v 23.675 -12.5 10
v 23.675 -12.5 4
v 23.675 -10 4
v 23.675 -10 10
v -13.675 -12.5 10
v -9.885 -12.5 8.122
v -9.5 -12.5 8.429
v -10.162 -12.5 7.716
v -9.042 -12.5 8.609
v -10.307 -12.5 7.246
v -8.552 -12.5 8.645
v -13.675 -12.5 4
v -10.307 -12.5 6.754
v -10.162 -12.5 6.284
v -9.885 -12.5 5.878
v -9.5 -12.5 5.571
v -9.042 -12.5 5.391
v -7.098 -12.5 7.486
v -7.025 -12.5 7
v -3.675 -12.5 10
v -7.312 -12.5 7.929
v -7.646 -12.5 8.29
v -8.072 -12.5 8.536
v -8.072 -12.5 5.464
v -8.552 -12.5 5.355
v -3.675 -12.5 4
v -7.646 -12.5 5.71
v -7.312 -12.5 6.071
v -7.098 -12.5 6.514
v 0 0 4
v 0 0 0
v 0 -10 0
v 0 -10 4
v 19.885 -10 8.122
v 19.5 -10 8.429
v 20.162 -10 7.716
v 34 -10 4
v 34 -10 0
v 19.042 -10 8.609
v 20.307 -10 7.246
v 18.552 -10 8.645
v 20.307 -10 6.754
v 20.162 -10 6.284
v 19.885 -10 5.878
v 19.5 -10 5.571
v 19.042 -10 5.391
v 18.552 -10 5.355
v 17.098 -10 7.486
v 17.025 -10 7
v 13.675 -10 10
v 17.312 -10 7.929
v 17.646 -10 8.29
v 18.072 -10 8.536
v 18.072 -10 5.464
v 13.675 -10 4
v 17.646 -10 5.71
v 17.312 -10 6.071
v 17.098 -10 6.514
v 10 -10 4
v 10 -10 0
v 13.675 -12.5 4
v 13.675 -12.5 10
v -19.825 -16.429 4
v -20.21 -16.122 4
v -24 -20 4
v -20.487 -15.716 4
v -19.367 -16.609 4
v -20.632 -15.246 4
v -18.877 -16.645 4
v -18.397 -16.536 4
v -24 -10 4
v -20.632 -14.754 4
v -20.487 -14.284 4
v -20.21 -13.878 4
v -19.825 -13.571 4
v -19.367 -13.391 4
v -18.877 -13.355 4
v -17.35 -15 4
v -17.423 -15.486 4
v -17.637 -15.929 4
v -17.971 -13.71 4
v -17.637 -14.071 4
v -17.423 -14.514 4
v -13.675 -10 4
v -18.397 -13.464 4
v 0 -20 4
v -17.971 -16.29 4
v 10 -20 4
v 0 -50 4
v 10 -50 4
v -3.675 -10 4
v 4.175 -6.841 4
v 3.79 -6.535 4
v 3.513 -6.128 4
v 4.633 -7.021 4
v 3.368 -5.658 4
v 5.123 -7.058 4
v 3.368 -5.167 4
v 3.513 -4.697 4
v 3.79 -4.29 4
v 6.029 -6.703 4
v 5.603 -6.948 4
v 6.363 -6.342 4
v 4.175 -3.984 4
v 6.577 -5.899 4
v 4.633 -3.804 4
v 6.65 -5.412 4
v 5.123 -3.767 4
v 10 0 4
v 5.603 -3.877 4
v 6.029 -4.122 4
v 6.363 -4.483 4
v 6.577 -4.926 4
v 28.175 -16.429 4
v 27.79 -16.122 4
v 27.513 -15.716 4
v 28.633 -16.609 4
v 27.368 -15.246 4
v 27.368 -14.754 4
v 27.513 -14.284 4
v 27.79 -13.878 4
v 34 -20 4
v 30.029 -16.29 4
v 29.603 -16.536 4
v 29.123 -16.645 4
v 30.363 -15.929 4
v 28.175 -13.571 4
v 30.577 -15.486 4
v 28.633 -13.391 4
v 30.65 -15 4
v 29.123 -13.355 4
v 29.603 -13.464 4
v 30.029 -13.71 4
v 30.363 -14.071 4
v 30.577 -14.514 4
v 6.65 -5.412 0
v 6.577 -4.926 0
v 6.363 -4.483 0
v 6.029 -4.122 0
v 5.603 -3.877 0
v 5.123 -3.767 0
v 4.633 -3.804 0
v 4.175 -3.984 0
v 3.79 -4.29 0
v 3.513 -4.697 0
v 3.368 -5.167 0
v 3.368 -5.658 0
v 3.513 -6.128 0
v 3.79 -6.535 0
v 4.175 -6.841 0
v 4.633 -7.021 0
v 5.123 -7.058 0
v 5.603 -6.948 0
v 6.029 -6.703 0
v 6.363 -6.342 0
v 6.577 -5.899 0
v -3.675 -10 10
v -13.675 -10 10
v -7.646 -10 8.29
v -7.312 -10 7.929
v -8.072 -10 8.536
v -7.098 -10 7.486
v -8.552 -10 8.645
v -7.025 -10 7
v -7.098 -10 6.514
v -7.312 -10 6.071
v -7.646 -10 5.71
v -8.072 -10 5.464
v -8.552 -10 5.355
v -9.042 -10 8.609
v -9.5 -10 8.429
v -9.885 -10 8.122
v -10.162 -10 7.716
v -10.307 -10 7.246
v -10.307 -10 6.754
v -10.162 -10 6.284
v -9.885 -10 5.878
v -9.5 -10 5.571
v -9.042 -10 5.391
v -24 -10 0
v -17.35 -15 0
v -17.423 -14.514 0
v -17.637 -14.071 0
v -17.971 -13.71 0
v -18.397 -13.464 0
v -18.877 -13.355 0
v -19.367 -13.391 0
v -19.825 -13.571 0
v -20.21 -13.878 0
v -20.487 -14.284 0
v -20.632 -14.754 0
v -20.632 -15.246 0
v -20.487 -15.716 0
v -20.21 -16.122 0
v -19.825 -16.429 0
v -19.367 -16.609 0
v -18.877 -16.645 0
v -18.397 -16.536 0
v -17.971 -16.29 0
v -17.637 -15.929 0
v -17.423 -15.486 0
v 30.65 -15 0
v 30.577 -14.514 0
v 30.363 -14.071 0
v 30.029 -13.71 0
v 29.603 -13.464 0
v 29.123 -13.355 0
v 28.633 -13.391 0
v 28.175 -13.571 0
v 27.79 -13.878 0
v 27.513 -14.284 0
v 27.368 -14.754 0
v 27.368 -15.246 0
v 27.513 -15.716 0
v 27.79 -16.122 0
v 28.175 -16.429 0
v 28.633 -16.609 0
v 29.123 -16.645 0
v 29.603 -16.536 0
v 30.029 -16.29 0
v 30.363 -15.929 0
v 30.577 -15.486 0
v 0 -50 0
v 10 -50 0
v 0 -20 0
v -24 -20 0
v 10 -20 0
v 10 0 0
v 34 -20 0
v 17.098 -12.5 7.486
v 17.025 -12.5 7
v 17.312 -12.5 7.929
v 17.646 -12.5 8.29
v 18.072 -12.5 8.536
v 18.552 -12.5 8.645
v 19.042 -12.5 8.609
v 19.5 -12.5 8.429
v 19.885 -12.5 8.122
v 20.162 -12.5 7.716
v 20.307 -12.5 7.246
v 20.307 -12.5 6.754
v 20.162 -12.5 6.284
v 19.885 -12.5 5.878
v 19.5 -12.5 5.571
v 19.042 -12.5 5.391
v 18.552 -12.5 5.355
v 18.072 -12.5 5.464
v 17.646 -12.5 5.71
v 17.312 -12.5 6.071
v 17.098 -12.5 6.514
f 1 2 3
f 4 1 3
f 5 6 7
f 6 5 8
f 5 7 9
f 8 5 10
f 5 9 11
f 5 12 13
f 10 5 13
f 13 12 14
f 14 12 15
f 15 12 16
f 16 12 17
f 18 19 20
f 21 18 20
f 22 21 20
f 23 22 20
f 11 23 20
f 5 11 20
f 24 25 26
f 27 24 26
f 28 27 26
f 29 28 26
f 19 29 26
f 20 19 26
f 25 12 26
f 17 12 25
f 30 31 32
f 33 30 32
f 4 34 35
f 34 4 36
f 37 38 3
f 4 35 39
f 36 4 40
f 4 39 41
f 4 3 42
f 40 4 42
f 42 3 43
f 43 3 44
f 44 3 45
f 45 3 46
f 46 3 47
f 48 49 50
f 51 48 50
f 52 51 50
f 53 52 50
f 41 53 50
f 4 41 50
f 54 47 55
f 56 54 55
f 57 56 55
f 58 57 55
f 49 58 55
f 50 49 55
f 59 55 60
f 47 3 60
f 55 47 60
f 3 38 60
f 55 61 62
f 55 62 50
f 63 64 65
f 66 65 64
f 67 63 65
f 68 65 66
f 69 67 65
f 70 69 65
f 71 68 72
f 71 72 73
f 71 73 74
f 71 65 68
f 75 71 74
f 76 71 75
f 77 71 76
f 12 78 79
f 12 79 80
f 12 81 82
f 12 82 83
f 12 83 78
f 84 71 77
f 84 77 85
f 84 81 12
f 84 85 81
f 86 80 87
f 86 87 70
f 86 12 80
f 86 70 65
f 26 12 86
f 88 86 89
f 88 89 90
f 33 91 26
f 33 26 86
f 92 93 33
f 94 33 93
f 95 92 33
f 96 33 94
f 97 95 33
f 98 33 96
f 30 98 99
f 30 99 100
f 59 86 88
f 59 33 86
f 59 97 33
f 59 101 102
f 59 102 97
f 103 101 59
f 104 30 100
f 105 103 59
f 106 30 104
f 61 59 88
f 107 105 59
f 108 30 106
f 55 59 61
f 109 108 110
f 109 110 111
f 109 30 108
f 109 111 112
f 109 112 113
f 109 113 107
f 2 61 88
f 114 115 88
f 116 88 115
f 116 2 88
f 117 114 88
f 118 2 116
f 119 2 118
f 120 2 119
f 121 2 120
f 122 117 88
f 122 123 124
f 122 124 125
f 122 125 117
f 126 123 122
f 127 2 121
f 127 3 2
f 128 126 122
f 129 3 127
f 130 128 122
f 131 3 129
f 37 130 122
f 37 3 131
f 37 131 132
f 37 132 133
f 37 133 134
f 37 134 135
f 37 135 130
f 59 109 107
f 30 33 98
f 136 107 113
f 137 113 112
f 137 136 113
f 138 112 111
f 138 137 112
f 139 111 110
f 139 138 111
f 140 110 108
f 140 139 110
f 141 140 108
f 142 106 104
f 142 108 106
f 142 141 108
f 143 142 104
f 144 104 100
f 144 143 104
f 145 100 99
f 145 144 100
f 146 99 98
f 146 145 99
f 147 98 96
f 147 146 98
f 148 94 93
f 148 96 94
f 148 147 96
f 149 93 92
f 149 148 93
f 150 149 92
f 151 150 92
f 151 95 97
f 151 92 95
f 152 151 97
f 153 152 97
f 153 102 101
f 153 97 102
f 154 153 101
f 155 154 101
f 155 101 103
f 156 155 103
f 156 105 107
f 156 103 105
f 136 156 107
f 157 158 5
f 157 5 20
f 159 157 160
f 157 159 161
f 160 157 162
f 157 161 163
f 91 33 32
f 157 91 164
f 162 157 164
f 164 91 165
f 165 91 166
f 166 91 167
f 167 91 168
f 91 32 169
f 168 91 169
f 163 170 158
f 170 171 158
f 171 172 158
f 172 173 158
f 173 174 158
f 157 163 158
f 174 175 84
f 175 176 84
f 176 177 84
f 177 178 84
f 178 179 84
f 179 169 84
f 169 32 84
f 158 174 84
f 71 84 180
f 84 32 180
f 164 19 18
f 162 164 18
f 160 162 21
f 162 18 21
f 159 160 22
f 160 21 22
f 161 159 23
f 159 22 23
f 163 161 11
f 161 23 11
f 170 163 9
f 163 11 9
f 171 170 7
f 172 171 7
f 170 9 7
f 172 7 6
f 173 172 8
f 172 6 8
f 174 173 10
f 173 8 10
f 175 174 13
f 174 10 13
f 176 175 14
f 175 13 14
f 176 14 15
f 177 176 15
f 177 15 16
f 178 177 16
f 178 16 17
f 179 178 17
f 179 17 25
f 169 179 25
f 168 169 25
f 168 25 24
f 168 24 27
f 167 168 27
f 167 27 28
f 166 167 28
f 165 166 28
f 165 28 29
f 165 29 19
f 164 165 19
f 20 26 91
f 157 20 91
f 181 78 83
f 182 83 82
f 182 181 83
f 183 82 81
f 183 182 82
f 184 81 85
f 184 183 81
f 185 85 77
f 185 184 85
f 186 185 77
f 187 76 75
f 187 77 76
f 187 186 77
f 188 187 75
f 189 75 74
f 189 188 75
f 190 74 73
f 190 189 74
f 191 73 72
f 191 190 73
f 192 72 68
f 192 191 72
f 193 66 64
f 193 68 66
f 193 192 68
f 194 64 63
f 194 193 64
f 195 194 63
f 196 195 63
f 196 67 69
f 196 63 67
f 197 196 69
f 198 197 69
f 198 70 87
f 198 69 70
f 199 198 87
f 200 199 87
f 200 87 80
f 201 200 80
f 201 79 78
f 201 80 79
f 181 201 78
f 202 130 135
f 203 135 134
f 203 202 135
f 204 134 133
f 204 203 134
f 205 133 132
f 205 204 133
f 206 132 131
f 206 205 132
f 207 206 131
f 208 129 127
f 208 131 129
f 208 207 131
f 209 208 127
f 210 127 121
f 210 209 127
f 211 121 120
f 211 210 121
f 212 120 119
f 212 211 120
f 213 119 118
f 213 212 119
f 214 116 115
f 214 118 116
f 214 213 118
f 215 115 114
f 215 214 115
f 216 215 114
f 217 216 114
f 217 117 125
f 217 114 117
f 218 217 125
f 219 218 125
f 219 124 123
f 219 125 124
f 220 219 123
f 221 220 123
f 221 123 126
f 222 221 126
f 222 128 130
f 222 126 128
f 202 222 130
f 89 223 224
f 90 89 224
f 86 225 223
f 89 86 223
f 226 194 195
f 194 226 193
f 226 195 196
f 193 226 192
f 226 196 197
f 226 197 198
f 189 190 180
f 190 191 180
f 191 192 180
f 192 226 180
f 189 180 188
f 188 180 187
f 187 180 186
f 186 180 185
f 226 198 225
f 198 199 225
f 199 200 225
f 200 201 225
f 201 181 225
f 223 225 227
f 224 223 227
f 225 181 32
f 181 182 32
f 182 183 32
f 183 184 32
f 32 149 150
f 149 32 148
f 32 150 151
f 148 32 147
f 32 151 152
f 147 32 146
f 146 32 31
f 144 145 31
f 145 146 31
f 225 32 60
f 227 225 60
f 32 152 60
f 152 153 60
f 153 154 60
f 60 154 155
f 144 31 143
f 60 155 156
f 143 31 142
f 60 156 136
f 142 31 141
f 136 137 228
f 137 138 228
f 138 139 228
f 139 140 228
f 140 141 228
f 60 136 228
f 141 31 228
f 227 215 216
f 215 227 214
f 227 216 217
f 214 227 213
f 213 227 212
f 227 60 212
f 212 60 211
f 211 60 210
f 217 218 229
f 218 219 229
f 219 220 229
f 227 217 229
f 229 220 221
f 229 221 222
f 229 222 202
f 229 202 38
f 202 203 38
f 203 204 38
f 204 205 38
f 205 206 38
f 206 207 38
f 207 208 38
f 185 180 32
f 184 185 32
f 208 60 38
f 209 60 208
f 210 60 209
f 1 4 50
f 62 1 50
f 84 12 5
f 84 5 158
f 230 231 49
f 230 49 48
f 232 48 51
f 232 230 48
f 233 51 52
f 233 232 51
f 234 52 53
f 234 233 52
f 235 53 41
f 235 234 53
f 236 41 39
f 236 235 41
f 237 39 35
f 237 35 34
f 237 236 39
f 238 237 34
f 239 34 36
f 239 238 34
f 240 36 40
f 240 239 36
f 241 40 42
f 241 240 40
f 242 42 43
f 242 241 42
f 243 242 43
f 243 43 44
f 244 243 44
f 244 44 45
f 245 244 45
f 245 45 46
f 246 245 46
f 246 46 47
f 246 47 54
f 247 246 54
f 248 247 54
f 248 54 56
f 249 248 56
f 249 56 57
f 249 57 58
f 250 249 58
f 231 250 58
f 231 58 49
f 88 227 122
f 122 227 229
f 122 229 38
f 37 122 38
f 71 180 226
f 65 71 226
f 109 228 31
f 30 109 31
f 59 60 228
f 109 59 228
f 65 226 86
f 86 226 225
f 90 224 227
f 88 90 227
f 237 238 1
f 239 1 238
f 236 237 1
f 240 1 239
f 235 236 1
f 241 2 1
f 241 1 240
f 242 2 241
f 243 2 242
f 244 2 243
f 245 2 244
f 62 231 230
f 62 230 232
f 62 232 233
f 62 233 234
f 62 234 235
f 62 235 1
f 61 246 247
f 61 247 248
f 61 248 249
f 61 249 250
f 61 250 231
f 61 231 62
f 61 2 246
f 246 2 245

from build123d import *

# Parameters (mm, degrees)
F0_R     = 1.65
F1_DEPTH = 4
F2_W     = 10
F2_H     = 2.5
F3_DEPTH = 6
F4_R     = 1.65
F5_DEPTH = 12.501


with BuildPart() as f1:
    # F0 (on Top) → F1 (new body)
    with BuildSketch(Plane.XY):
        Polygon((10, 0), (0, 0), (0, -10), (-24, -10), (-24, -20), (0, -20), (0, -50), (10, -50), (10, -20), (34, -20), (34, -10), (10, -10), align=None)
        with Locations((-19, -15)):
            Circle(F0_R, mode=Mode.SUBTRACT)
        with Locations((29, -15)):
            Circle(F0_R, mode=Mode.SUBTRACT)
        with Locations((5, -5.4125)):
            Circle(F0_R, mode=Mode.SUBTRACT)
    extrude(amount=F1_DEPTH)

    # F2 (on face) → F3 (join)
    with BuildSketch(Plane.XY.offset(4)):
        with Locations((-8.675, -11.25)):
            Rectangle(F2_W, F2_H)
    extrude(amount=F3_DEPTH)

    # F4 (on face) → F5 (cut, through all)
    with BuildSketch(Plane.XZ.offset(12.5)):
        with Locations((-8.675, 7)):
            Circle(F4_R)
    extrude(amount=-F5_DEPTH, mode=Mode.SUBTRACT)

    # F7: F1 across plane


with BuildPart() as f1_1:
    add(f1.part)
    add(f1.part.mirror(Plane(origin=(5, -35, 2), x_dir=(0, 1, 0), z_dir=(1, 0, 0))))


solid = f1_1.part
